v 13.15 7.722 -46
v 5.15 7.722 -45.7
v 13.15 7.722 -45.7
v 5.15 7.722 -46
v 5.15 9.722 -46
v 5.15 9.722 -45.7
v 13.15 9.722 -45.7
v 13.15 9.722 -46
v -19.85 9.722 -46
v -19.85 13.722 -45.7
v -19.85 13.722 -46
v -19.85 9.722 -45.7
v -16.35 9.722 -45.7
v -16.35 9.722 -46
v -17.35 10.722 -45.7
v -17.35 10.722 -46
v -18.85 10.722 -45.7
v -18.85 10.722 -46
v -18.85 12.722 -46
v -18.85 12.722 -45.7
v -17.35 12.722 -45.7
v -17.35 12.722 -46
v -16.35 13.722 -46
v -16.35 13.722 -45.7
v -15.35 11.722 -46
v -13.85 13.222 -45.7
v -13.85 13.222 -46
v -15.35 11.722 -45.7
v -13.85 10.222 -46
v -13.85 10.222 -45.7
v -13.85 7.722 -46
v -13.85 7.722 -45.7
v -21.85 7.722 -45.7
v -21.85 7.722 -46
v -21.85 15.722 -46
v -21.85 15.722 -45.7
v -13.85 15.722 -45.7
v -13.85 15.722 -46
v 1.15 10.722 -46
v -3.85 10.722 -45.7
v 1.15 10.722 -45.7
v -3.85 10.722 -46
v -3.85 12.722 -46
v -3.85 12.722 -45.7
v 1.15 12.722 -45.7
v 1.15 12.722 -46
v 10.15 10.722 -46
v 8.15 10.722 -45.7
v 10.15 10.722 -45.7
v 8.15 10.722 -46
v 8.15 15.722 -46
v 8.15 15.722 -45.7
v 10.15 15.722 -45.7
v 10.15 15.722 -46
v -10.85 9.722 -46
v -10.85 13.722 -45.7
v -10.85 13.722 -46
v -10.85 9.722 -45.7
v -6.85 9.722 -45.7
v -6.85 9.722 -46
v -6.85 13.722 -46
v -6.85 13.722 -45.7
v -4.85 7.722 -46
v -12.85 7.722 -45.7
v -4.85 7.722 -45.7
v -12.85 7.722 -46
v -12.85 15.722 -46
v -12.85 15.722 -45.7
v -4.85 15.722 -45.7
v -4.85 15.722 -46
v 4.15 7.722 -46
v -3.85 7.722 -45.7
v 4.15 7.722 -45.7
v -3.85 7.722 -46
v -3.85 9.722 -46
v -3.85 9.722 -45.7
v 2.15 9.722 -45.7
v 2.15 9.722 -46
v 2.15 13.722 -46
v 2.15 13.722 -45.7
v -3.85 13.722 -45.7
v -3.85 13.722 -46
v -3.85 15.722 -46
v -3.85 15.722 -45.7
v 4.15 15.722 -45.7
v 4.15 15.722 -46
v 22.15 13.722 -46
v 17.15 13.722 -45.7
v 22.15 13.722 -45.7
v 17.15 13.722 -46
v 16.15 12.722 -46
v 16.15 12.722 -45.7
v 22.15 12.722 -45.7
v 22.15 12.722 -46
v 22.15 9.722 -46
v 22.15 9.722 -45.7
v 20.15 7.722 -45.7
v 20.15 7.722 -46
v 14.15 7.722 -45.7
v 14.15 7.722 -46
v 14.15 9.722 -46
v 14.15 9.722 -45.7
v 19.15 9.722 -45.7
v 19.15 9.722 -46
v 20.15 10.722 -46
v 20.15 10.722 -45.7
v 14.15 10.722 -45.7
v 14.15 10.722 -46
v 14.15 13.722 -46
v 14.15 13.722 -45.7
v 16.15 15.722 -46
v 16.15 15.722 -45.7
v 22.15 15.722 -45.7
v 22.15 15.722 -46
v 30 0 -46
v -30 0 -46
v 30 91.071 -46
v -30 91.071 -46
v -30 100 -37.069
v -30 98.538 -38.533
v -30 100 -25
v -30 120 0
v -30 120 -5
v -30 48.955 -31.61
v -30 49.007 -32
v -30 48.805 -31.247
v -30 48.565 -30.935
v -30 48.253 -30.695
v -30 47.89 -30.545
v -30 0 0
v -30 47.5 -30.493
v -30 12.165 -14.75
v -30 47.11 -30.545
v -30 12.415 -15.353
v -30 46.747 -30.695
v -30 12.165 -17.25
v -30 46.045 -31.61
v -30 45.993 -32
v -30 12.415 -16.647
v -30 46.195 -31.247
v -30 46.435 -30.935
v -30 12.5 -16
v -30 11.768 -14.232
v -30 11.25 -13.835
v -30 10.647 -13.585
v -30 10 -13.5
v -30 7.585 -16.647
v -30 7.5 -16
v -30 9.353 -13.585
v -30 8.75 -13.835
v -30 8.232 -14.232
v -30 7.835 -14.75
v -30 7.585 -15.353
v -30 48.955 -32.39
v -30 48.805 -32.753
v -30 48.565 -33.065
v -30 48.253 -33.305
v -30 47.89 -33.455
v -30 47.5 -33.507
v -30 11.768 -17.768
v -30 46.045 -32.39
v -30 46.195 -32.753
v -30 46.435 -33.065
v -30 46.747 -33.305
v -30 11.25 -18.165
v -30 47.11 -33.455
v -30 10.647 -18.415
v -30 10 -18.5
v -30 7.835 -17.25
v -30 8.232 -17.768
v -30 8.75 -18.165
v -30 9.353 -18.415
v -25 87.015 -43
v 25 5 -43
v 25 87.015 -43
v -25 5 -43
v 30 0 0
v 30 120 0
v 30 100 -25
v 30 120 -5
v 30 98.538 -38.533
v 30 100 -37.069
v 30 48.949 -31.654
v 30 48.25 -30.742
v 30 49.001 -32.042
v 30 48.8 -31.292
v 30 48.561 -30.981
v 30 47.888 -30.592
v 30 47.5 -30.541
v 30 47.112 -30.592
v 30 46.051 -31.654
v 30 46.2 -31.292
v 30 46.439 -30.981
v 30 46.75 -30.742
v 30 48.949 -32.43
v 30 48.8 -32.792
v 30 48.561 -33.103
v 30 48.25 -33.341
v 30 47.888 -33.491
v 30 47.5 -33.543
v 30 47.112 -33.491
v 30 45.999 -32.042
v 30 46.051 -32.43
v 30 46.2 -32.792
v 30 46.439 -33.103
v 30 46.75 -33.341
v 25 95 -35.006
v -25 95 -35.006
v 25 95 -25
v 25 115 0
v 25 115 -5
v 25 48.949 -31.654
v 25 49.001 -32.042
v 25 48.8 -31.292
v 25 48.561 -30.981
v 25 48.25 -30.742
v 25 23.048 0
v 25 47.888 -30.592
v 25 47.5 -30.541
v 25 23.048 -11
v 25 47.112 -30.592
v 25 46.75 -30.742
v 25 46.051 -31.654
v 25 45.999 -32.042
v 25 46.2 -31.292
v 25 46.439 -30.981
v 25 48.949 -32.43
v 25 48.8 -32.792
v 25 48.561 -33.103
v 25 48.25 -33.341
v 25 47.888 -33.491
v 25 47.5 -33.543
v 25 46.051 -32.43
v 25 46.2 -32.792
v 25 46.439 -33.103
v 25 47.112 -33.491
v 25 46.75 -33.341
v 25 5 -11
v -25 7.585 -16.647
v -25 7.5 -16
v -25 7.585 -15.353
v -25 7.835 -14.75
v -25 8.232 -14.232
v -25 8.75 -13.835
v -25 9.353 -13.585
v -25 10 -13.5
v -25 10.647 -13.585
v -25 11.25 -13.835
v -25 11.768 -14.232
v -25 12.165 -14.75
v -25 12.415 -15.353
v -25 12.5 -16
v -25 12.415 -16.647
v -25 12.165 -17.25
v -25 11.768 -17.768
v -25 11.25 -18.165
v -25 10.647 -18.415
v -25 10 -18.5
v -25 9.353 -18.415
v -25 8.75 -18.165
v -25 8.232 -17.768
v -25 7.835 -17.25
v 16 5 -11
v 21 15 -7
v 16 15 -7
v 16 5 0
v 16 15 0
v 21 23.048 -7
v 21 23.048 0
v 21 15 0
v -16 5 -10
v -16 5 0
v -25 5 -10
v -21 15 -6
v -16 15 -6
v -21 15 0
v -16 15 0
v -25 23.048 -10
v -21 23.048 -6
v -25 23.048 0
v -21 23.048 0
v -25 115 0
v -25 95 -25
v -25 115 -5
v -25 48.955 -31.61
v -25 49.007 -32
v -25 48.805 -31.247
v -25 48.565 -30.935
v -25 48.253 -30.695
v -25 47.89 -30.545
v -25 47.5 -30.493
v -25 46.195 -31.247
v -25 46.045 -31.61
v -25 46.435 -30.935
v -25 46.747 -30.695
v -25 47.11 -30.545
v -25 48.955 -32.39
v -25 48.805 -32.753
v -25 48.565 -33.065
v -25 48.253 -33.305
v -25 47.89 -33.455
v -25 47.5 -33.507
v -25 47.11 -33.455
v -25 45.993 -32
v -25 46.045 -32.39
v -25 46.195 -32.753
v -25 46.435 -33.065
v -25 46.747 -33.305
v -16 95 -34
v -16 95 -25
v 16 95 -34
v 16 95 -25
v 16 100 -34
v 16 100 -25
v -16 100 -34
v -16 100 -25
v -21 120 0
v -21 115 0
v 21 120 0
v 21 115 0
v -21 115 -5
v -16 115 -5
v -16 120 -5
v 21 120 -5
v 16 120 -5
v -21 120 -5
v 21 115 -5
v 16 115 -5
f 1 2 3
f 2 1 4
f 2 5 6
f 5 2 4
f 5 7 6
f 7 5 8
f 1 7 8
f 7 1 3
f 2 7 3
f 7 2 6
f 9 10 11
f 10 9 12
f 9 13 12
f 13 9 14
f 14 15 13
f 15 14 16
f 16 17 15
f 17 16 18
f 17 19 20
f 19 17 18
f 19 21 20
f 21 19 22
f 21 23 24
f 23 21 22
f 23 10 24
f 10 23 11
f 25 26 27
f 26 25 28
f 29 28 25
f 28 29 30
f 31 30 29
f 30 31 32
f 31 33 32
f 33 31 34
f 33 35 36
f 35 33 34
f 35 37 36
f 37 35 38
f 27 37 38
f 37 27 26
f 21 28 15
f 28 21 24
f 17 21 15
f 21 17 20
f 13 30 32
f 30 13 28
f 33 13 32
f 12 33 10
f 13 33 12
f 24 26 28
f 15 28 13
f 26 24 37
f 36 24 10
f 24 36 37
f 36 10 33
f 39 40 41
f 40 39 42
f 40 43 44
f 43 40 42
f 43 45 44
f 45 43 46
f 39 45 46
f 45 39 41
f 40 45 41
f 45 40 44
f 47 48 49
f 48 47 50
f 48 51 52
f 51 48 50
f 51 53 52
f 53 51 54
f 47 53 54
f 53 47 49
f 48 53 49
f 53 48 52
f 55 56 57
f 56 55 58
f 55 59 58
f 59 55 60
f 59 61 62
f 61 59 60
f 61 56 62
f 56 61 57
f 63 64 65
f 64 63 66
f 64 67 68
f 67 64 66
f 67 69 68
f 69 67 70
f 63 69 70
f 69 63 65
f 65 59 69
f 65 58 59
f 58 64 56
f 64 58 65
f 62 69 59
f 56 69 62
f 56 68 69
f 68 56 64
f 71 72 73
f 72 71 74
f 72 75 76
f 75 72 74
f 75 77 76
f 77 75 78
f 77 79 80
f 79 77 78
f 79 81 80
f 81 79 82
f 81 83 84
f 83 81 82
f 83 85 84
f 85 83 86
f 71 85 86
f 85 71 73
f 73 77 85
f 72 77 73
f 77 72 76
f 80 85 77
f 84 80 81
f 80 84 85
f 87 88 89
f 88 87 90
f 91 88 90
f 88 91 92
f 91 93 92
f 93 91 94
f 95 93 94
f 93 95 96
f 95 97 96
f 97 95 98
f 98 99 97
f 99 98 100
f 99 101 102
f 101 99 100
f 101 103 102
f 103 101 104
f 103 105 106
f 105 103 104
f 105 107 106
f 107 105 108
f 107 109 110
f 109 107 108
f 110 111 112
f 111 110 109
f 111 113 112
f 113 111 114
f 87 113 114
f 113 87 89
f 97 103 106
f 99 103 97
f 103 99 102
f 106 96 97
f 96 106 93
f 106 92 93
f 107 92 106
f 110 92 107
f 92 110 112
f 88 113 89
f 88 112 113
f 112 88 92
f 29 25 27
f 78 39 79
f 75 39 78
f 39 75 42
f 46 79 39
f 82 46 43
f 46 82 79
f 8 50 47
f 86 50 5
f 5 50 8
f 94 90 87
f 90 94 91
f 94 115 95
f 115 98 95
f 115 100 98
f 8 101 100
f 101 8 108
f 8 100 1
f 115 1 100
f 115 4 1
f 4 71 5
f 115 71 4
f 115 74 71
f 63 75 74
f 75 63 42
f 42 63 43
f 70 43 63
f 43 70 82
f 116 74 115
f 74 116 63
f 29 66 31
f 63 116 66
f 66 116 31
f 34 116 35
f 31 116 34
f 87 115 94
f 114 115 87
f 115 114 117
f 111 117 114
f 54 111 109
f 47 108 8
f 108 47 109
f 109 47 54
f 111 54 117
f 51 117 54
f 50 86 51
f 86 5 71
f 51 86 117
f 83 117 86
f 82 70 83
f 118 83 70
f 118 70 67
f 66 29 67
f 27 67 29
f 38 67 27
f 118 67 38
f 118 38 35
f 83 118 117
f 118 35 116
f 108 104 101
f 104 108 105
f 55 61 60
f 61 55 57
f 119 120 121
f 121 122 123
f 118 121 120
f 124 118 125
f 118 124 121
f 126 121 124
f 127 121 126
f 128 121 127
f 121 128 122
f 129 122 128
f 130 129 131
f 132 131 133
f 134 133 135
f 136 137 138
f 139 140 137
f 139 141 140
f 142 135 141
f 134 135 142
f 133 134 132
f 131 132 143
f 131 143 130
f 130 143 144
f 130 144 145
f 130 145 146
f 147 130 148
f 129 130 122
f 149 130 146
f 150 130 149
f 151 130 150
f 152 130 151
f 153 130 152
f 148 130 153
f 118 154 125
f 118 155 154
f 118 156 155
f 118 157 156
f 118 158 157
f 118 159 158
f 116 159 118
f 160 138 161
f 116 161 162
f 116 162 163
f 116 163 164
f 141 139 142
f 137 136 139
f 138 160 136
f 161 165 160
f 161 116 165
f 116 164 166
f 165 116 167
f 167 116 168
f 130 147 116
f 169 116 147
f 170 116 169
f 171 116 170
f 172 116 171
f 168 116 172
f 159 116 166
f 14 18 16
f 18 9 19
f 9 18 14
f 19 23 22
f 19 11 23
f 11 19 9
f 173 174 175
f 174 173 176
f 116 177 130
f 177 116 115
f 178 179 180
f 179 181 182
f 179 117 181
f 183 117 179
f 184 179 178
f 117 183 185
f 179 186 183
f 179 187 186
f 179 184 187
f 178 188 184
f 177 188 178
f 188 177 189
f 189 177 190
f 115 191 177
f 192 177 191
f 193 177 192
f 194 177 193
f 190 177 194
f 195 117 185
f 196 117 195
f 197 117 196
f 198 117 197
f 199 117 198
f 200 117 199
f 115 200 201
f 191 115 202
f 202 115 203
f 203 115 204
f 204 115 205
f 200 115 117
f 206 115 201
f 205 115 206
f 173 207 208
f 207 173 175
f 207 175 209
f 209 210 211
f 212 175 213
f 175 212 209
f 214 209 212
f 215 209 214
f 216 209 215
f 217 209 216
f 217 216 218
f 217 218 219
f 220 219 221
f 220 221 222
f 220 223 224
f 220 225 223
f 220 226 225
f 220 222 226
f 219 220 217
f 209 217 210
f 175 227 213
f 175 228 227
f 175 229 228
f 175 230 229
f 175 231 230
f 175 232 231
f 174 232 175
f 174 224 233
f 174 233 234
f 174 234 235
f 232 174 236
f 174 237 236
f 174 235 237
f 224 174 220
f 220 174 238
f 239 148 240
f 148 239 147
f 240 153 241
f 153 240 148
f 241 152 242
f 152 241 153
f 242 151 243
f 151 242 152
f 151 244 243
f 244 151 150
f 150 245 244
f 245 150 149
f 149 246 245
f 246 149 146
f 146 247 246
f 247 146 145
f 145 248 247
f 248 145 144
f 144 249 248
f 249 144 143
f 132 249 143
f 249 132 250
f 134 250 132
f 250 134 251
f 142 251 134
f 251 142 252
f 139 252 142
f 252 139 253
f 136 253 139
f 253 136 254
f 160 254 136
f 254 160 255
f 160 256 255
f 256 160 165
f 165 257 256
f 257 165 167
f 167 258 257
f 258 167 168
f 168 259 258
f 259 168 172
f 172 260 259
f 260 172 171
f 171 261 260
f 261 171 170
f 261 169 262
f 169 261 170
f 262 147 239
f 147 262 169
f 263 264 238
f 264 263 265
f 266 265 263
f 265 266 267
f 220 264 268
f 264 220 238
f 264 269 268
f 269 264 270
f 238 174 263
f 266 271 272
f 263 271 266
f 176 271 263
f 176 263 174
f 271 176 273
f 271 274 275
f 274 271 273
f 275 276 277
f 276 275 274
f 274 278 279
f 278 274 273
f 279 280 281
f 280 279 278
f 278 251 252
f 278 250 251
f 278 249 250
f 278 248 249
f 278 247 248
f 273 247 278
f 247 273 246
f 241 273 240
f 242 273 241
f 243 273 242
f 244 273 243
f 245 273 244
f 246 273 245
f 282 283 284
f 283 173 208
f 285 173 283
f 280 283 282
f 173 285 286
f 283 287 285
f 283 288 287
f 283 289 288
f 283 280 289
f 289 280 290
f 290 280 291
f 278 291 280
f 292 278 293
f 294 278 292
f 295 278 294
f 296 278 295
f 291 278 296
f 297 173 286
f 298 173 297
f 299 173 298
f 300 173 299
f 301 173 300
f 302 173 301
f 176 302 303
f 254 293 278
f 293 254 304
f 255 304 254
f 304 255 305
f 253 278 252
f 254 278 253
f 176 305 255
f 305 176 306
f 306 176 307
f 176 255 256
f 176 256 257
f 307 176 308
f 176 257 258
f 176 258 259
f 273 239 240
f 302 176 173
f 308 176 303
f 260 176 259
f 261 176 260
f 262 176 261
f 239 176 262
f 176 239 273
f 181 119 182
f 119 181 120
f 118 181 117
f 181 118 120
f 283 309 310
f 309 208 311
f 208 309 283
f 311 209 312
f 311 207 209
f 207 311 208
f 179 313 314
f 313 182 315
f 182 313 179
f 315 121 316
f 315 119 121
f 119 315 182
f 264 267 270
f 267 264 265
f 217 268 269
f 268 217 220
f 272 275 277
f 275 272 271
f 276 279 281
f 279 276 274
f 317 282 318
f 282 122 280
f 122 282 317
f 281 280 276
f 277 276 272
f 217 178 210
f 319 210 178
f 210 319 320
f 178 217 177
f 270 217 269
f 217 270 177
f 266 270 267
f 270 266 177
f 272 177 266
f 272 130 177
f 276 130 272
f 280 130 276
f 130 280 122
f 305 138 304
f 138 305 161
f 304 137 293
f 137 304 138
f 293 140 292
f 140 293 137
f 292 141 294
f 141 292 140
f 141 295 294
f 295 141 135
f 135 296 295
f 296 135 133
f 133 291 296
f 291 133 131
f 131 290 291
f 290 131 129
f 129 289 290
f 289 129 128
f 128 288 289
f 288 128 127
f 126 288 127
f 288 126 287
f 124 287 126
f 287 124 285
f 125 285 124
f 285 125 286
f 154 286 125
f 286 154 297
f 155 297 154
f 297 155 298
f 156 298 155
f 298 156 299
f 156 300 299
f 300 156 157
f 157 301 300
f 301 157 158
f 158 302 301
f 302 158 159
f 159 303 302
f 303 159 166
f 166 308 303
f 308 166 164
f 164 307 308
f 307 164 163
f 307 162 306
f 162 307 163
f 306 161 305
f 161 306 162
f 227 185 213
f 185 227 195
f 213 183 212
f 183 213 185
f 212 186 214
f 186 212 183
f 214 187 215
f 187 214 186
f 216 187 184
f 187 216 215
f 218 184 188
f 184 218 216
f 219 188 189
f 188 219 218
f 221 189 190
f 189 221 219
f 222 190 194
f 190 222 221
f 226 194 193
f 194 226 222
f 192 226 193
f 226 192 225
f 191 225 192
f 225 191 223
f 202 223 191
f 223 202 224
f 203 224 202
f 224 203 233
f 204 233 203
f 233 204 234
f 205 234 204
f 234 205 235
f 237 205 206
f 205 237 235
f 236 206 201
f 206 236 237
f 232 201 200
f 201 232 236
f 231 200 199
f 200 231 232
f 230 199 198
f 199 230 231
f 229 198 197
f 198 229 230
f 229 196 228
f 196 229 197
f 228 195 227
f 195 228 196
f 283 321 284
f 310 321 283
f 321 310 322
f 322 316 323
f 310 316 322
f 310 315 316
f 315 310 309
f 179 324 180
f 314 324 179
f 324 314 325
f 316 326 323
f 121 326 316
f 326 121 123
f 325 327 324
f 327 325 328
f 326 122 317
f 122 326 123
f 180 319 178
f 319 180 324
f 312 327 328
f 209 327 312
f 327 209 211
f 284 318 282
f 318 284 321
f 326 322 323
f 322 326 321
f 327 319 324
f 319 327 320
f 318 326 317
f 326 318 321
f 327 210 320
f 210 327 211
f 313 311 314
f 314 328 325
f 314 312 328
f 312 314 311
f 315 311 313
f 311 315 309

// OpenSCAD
holeOnBack = 0; //0:No,1:Yes
capHoleHeight = 34;

module dummy() {}

stlObject1_points=[
   [13.1497,45.7,7.722054],
   [5.149704,46,7.722054],
   [13.1497,46,7.722054],
   [5.149704,45.7,7.722054],
   [5.149704,46,9.722054],
   [5.149704,45.7,9.722054],
   [13.1497,46,9.722054],
   [13.1497,45.7,9.722054],
   [-19.8503,45.7,13.72205],
   [-19.8503,46,9.722054],
   [-19.8503,46,13.72205],
   [-19.8503,45.7,9.722054],
   [-16.3503,46,9.722054],
   [-16.3503,45.7,9.722054],
   [-17.3503,46,10.72205],
   [-17.3503,45.7,10.72205],
   [-18.8503,46,10.72205],
   [-18.8503,45.7,10.72205],
   [-18.8503,46,12.72205],
   [-18.8503,45.7,12.72205],
   [-17.3503,46,12.72205],
   [-17.3503,45.7,12.72205],
   [-16.3503,46,13.72205],
   [-16.3503,45.7,13.72205],
   [-13.85029,45.7,13.22205],
   [-15.35029,46,11.72205],
   [-13.85029,46,13.22205],
   [-15.35029,45.7,11.72205],
   [-13.85029,46,10.22205],
   [-13.85029,45.7,10.22205],
   [-13.85029,46,7.722054],
   [-13.85029,45.7,7.722054],
   [-21.8503,46,7.722054],
   [-21.8503,45.7,7.722054],
   [-21.8503,46,15.72205],
   [-21.8503,45.7,15.72205],
   [-13.85029,46,15.72205],
   [-13.85029,45.7,15.72205],
   [1.149704,45.7,10.72205],
   [-3.850294,46,10.72205],
   [1.149704,46,10.72205],
   [-3.850294,45.7,10.72205],
   [-3.850294,46,12.72205],
   [-3.850294,45.7,12.72205],
   [1.149704,46,12.72205],
   [1.149704,45.7,12.72205],
   [10.1497,45.7,10.72205],
   [8.149704,46,10.72205],
   [10.1497,46,10.72205],
   [8.149704,45.7,10.72205],
   [8.149704,46,15.72205],
   [8.149704,45.7,15.72205],
   [10.1497,46,15.72205],
   [10.1497,45.7,15.72205],
   [-10.85029,45.7,13.72205],
   [-10.85029,46,9.722054],
   [-10.85029,46,13.72205],
   [-10.85029,45.7,9.722054],
   [-6.850294,46,9.722054],
   [-6.850294,45.7,9.722054],
   [-6.850294,46,13.72205],
   [-6.850294,45.7,13.72205],
   [-4.850294,45.7,7.722054],
   [-12.85029,46,7.722054],
   [-4.850294,46,7.722054],
   [-12.85029,45.7,7.722054],
   [-12.85029,46,15.72205],
   [-12.85029,45.7,15.72205],
   [-4.850294,46,15.72205],
   [-4.850294,45.7,15.72205],
   [4.149708,45.7,7.722054],
   [-3.850294,46,7.722054],
   [4.149708,46,7.722054],
   [-3.850294,45.7,7.722054],
   [-3.850294,46,9.722054],
   [-3.850294,45.7,9.722054],
   [2.149704,46,9.722054],
   [2.149704,45.7,9.722054],
   [2.149704,46,13.72205],
   [2.149704,45.7,13.72205],
   [-3.850294,46,13.72205],
   [-3.850294,45.7,13.72205],
   [-3.850294,46,15.72205],
   [-3.850294,45.7,15.72205],
   [4.149708,46,15.72205],
   [4.149708,45.7,15.72205],
   [22.14971,45.7,13.72205],
   [17.1497,46,13.72205],
   [22.14971,46,13.72205],
   [17.1497,45.7,13.72205],
   [16.14971,46,12.72205],
   [16.14971,45.7,12.72205],
   [22.14971,46,12.72205],
   [22.14971,45.7,12.72205],
   [22.14971,46,9.722054],
   [22.14971,45.7,9.722054],
   [20.1497,46,7.722054],
   [20.1497,45.7,7.722054],
   [14.14971,46,7.722054],
   [14.14971,45.7,7.722054],
   [14.14971,46,9.722054],
   [14.14971,45.7,9.722054],
   [19.14971,46,9.722054],
   [19.14971,45.7,9.722054],
   [20.1497,46,10.72205],
   [20.1497,45.7,10.72205],
   [14.14971,46,10.72205],
   [14.14971,45.7,10.72205],
   [14.14971,46,13.72205],
   [14.14971,45.7,13.72205],
   [16.14971,46,15.72205],
   [16.14971,45.7,15.72205],
   [22.14971,46,15.72205],
   [22.14971,45.7,15.72205],
   [30,46,0],
   [30,46,91.07107],
   [-30,46,0],
   [-30,46,91.07107],
   [-30,0,0],
   [-30,16,7.5],
   [-30,15.35295,7.585186],
   [-30,16.64705,7.585186],
   [-30,17.25,7.834937],
   [-30,17.76777,8.232233],
   [-30,18.16506,8.75],
   [-30,18.41481,9.352953],
   [-30,18.5,10],
   [-30,31.24666,46.19518],
   [-30,18.41481,10.64705],
   [-30,31.61004,46.04466],
   [-30,32,45.99332],
   [-30,30.69518,46.74666],
   [-30,18.16506,11.25],
   [-30,30.93462,46.43462],
   [-30,30.54465,47.11004],
   [-30,17.76777,11.76777],
   [-30,30.49332,47.5],
   [-30,17.25,12.16506],
   [-30,16.64705,12.41481],
   [-30,16,12.5],
   [-30,15.35295,12.41481],
   [-30,14.75,12.16506],
   [-30,25,100],
   [-30,14.23223,11.76777],
   [-30,5,120],
   [-30,13.83494,11.25],
   [-30,0,120],
   [-30,13.58519,10.64705],
   [-30,13.5,10],
   [-30,13.58519,9.352953],
   [-30,13.83494,8.75],
   [-30,14.23223,8.232233],
   [-30,14.75,7.834937],
   [-30,32.38996,46.04466],
   [-30,32.75334,46.19518],
   [-30,33.06539,46.43462],
   [-30,33.30482,46.74666],
   [-30,33.45535,47.11004],
   [-30,33.50668,47.5],
   [-30,33.45535,47.88996],
   [-30,33.30482,48.25334],
   [-30,38.53314,98.53793],
   [-30,33.06539,48.56539],
   [-30,32.75334,48.80482],
   [-30,37.06908,100],
   [-30,32.38996,48.95535],
   [-30,32,49.00668],
   [-30,31.61004,48.95535],
   [-30,31.24666,48.80482],
   [-30,30.93462,48.56539],
   [-30,30.69518,48.25334],
   [-30,30.54465,47.88996],
   [25,43,5],
   [-25,43,87.01475],
   [25,43,87.01475],
   [-25,43,5],
   [30,0,0],
   [30,33.34149,48.25029],
   [30,38.53314,98.53793],
   [30,33.4914,47.88838],
   [30,33.54253,47.5],
   [30,32.79224,48.79955],
   [30,37.06908,100],
   [30,33.10302,48.56108],
   [30,31.65356,48.94946],
   [30,25,100],
   [30,32.04195,49.00059],
   [30,32.43032,48.94946],
   [30,5,120],
   [30,30.54136,47.5],
   [30,30.59249,47.88838],
   [30,0,120],
   [30,30.98087,46.43893],
   [30,30.7424,46.74971],
   [30,30.59249,47.11162],
   [30,33.4914,47.11162],
   [30,33.34149,46.74971],
   [30,33.10302,46.43893],
   [30,32.79224,46.20045],
   [30,32.43032,46.05054],
   [30,32.04195,45.99941],
   [30,31.65356,46.05054],
   [30,31.29165,46.20045],
   [30,30.7424,48.25029],
   [30,30.98087,48.56108],
   [30,31.29165,48.79955],
   [25,35.00568,95],
   [-25,35.00568,95],
   [25,32.04195,49.00059],
   [25,32.43032,48.94946],
   [25,31.65356,48.94946],
   [25,25,95],
   [25,31.29165,48.79955],
   [25,30.98087,48.56108],
   [25,30.7424,48.25029],
   [25,30.59249,47.88838],
   [25,11,23.04751],
   [25,30.54136,47.5],
   [25,30.59249,47.11162],
   [25,30.7424,46.74971],
   [25,30.98087,46.43893],
   [25,11,5],
   [25,31.29165,46.20045],
   [25,31.65356,46.05054],
   [25,32.04195,45.99941],
   [25,32.43032,46.05054],
   [25,32.79224,46.20045],
   [25,33.10302,46.43893],
   [25,33.34149,46.74971],
   [25,33.4914,47.11162],
   [25,33.54253,47.5],
   [25,33.4914,47.88838],
   [25,33.34149,48.25029],
   [25,33.10302,48.56108],
   [25,32.79224,48.79955],
   [25,5,115],
   [25,0,23.04751],
   [25,0,115],
   [-25,16,7.5],
   [-25,16.64705,7.585186],
   [-25,15.35295,7.585186],
   [-25,14.75,7.834937],
   [-25,14.23223,8.232233],
   [-25,13.83494,8.75],
   [-25,13.58519,9.352953],
   [-25,13.5,10],
   [-25,13.58519,10.64705],
   [-25,13.83494,11.25],
   [-25,14.23223,11.76777],
   [-25,14.75,12.16506],
   [-25,15.35295,12.41481],
   [-25,16,12.5],
   [-25,16.64705,12.41481],
   [-25,17.25,12.16506],
   [-25,17.76777,11.76777],
   [-25,18.16506,11.25],
   [-25,18.41481,10.64705],
   [-25,18.5,10],
   [-25,18.41481,9.352953],
   [-25,18.16506,8.75],
   [-25,17.76777,8.232233],
   [-25,17.25,7.834937],
   [21,7,15],
   [16,11,5],
   [16,7,15],
   [16,0,5],
   [16,0,15],
   [21,7,23.04751],
   [21,0,23.04751],
   [21,0,15],
   [-16,10,5],
   [-25,10,5],
   [-16,0,5],
   [-21,6,15],
   [-16,6,15],
   [-16,0,15],
   [-21,0,15],
   [-25,10,23.04751],
   [-21,6,23.04751],
   [-25,0,23.04751],
   [-21,0,23.04751],
   [-25,33.50668,47.5],
   [-25,33.45535,47.11004],
   [-25,33.30482,46.74666],
   [-25,33.06539,48.56539],
   [-25,33.30482,48.25334],
   [-25,33.45535,47.88996],
   [-25,31.61004,48.95535],
   [-25,25,95],
   [-25,32,49.00668],
   [-25,32.38996,48.95535],
   [-25,5,115],
   [-25,30.54465,47.88996],
   [-25,30.69518,48.25334],
   [-25,0,115],
   [-25,30.49332,47.5],
   [-25,30.54465,47.11004],
   [-25,30.69518,46.74666],
   [-25,30.93462,46.43462],
   [-25,31.24666,46.19518],
   [-25,31.61004,46.04466],
   [-25,32,45.99332],
   [-25,32.38996,46.04466],
   [-25,32.75334,46.19518],
   [-25,33.06539,46.43462],
   [-25,30.93462,48.56539],
   [-25,31.24666,48.80482],
   [-25,32.75334,48.80482],
   [15,30,95],
   [-16,30,95],
   [-16,25,95],
   [15,25,95],
   [15,30,100],
   [-16,30,100],
   [-16,25,100],
   [15,25,100],
   [-21,0,120],
   [-21,0,115],
   [21,0,120],
   [21,0,115],
   [-21,5,115],
   [-16,5,115],
   [15,5,115],
   [15,5,120],
   [-16,5,120],
   [21,5,120],
   [-21,5,120],
   [21,5,115],
 ];
stlObject1_faces=[
  [0,1,2,],
  [3,1,0,],
  [3,4,1,],
  [5,4,3,],
  [5,6,4,],
  [7,6,5,],
  [7,2,6,],
  [0,2,7,],
  [5,0,7,],
  [3,0,5,],
  [8,9,10,],
  [11,9,8,],
  [11,12,9,],
  [13,12,11,],
  [13,14,12,],
  [15,14,13,],
  [15,16,14,],
  [17,16,15,],
  [17,18,16,],
  [19,18,17,],
  [19,20,18,],
  [21,20,19,],
  [21,22,20,],
  [23,22,21,],
  [23,10,22,],
  [8,10,23,],
  [24,25,26,],
  [27,25,24,],
  [27,28,25,],
  [29,28,27,],
  [29,30,28,],
  [31,30,29,],
  [31,32,30,],
  [33,32,31,],
  [33,34,32,],
  [35,34,33,],
  [35,36,34,],
  [37,36,35,],
  [37,26,36,],
  [24,26,37,],
  [23,35,8,],
  [37,35,23,],
  [24,37,23,],
  [35,11,8,],
  [33,11,35,],
  [13,11,33,],
  [31,13,33,],
  [29,13,31,],
  [27,13,29,],
  [15,13,27,],
  [21,15,27,],
  [19,15,21,],
  [17,15,19,],
  [27,23,21,],
  [24,23,27,],
  [38,39,40,],
  [41,39,38,],
  [41,42,39,],
  [43,42,41,],
  [43,44,42,],
  [45,44,43,],
  [45,40,44,],
  [38,40,45,],
  [43,38,45,],
  [41,38,43,],
  [46,47,48,],
  [49,47,46,],
  [49,50,47,],
  [51,50,49,],
  [51,52,50,],
  [53,52,51,],
  [53,48,52,],
  [46,48,53,],
  [51,46,53,],
  [49,46,51,],
  [54,55,56,],
  [57,55,54,],
  [57,58,55,],
  [59,58,57,],
  [59,60,58,],
  [61,60,59,],
  [61,56,60,],
  [54,56,61,],
  [62,63,64,],
  [65,63,62,],
  [65,66,63,],
  [67,66,65,],
  [67,68,66,],
  [69,68,67,],
  [69,64,68,],
  [62,64,69,],
  [61,69,54,],
  [62,69,61,],
  [59,62,61,],
  [57,62,59,],
  [65,62,57,],
  [67,65,57,],
  [67,54,69,],
  [57,54,67,],
  [70,71,72,],
  [73,71,70,],
  [73,74,71,],
  [75,74,73,],
  [75,76,74,],
  [77,76,75,],
  [77,78,76,],
  [79,78,77,],
  [79,80,78,],
  [81,80,79,],
  [81,82,80,],
  [83,82,81,],
  [83,84,82,],
  [85,84,83,],
  [85,72,84,],
  [70,72,85,],
  [79,85,83,],
  [70,85,79,],
  [77,70,79,],
  [73,70,77,],
  [75,73,77,],
  [83,81,79,],
  [86,87,88,],
  [89,87,86,],
  [89,90,87,],
  [91,90,89,],
  [91,92,90,],
  [93,92,91,],
  [93,94,92,],
  [95,94,93,],
  [95,96,94,],
  [97,96,95,],
  [97,98,96,],
  [99,98,97,],
  [99,100,98,],
  [101,100,99,],
  [101,102,100,],
  [103,102,101,],
  [103,104,102,],
  [105,104,103,],
  [105,106,104,],
  [107,106,105,],
  [107,108,106,],
  [109,108,107,],
  [109,110,108,],
  [111,110,109,],
  [111,112,110,],
  [113,112,111,],
  [113,88,112,],
  [86,88,113,],
  [113,89,86,],
  [111,89,113,],
  [109,89,111,],
  [91,89,109,],
  [107,91,109,],
  [105,91,107,],
  [93,91,105,],
  [95,93,105,],
  [103,95,105,],
  [97,95,103,],
  [99,97,103,],
  [103,101,99,],
  [1,114,2,],
  [72,114,1,],
  [4,72,1,],
  [84,72,4,],
  [47,84,4,],
  [50,84,47,],
  [115,84,50,],
  [52,115,50,],
  [110,115,52,],
  [108,110,52,],
  [98,2,114,],
  [6,2,98,],
  [100,6,98,],
  [106,6,100,],
  [102,106,100,],
  [104,106,102,],
  [6,48,4,],
  [108,48,6,],
  [106,108,6,],
  [28,26,25,],
  [63,26,28,],
  [30,63,28,],
  [116,63,30,],
  [32,116,30,],
  [34,116,32,],
  [117,116,34,],
  [36,117,34,],
  [66,117,36,],
  [26,66,36,],
  [63,66,26,],
  [39,74,40,],
  [64,74,39,],
  [68,64,39,],
  [76,40,74,],
  [44,40,76,],
  [78,44,76,],
  [80,44,78,],
  [42,44,80,],
  [68,42,80,],
  [39,42,68,],
  [4,48,47,],
  [108,52,48,],
  [116,64,63,],
  [71,64,116,],
  [114,71,116,],
  [72,71,114,],
  [68,117,66,],
  [82,117,68,],
  [80,82,68,],
  [115,82,84,],
  [117,82,115,],
  [64,71,74,],
  [92,87,90,],
  [88,87,92,],
  [114,88,92,],
  [112,88,114,],
  [115,112,114,],
  [110,112,115,],
  [114,96,98,],
  [94,96,114,],
  [92,94,114,],
  [58,56,55,],
  [60,56,58,],
  [118,119,120,],
  [121,119,118,],
  [116,121,118,],
  [122,121,116,],
  [123,122,116,],
  [116,124,123,],
  [125,124,116,],
  [126,125,116,],
  [126,127,128,],
  [129,127,126,],
  [130,129,126,],
  [128,131,132,],
  [133,131,128,],
  [127,133,128,],
  [134,132,131,],
  [135,132,134,],
  [136,135,134,],
  [137,135,136,],
  [138,137,136,],
  [136,139,138,],
  [140,139,136,],
  [141,140,136,],
  [142,141,136,],
  [143,141,142,],
  [144,143,142,],
  [145,143,144,],
  [146,145,144,],
  [118,145,146,],
  [147,145,118,],
  [148,147,118,],
  [118,149,148,],
  [150,149,118,],
  [151,150,118,],
  [118,152,151,],
  [120,152,118,],
  [116,130,126,],
  [153,130,116,],
  [154,153,116,],
  [116,155,154,],
  [156,155,116,],
  [157,156,116,],
  [116,158,157,],
  [117,158,116,],
  [159,158,117,],
  [160,159,117,],
  [161,160,117,],
  [162,160,161,],
  [163,162,161,],
  [164,163,161,],
  [165,163,164,],
  [166,165,164,],
  [164,167,166,],
  [142,167,164,],
  [168,167,142,],
  [169,168,142,],
  [142,170,169,],
  [171,170,142,],
  [136,171,142,],
  [9,16,10,],
  [14,16,9,],
  [12,14,9,],
  [10,20,22,],
  [18,20,10,],
  [16,18,10,],
  [172,173,174,],
  [175,173,172,],
  [114,118,176,],
  [116,118,114,],
  [115,177,178,],
  [179,177,115,],
  [180,179,115,],
  [178,181,182,],
  [183,181,178,],
  [177,183,178,],
  [182,184,185,],
  [186,184,182,],
  [187,186,182,],
  [185,176,188,],
  [189,176,185,],
  [190,189,185,],
  [176,191,188,],
  [176,192,114,],
  [193,192,176,],
  [194,193,176,],
  [114,180,115,],
  [195,180,114,],
  [196,195,114,],
  [182,181,187,],
  [114,197,196,],
  [198,197,114,],
  [199,198,114,],
  [114,200,199,],
  [201,200,114,],
  [202,201,114,],
  [114,192,202,],
  [176,189,194,],
  [185,203,190,],
  [204,203,185,],
  [205,204,185,],
  [185,184,205,],
  [173,206,174,],
  [207,206,173,],
  [206,208,209,],
  [210,208,206,],
  [211,210,206,],
  [212,210,211,],
  [213,212,211,],
  [211,214,213,],
  [215,214,211,],
  [216,215,211,],
  [217,215,216,],
  [218,217,216,],
  [216,219,218,],
  [220,219,216,],
  [221,220,216,],
  [222,220,221,],
  [172,222,221,],
  [223,222,172,],
  [224,223,172,],
  [172,225,224,],
  [226,225,172,],
  [227,226,172,],
  [172,228,227,],
  [229,228,172,],
  [230,229,172,],
  [174,230,172,],
  [231,230,174,],
  [232,231,174,],
  [174,233,232,],
  [206,233,174,],
  [234,233,206,],
  [209,234,206,],
  [235,216,211,],
  [236,216,235,],
  [237,236,235,],
  [238,121,239,],
  [119,121,238,],
  [240,119,238,],
  [120,119,240,],
  [241,120,240,],
  [152,120,241,],
  [242,152,241,],
  [151,152,242,],
  [243,151,242,],
  [150,151,243,],
  [244,150,243,],
  [149,150,244,],
  [245,149,244,],
  [148,149,245,],
  [246,148,245,],
  [147,148,246,],
  [247,147,246,],
  [145,147,247,],
  [248,145,247,],
  [143,145,248,],
  [249,143,248,],
  [141,143,249,],
  [250,141,249,],
  [140,141,250,],
  [251,140,250,],
  [139,140,251,],
  [252,139,251,],
  [138,139,252,],
  [253,138,252,],
  [137,138,253,],
  [254,137,253,],
  [135,137,254,],
  [255,135,254,],
  [132,135,255,],
  [256,132,255,],
  [128,132,256,],
  [257,128,256,],
  [126,128,257,],
  [258,126,257,],
  [125,126,258,],
  [259,125,258,],
  [124,125,259,],
  [260,124,259,],
  [123,124,260,],
  [261,123,260,],
  [122,123,261,],
  [239,122,261,],
  [121,122,239,],
  [262,263,221,],
  [264,263,262,],
  [264,265,263,],
  [266,265,264,],
  [262,216,267,],
  [221,216,262,],
  [268,262,267,],
  [269,262,268,],
  [263,172,221,],
  [175,172,263,],
  [270,175,263,],
  [271,175,270,],
  [270,265,272,],
  [263,265,270,],
  [273,270,274,],
  [271,270,273,],
  [275,273,274,],
  [276,273,275,],
  [277,273,278,],
  [271,273,277,],
  [278,279,277,],
  [280,279,278,],
  [175,281,173,],
  [282,281,175,],
  [283,282,175,],
  [173,284,207,],
  [285,284,173,],
  [286,285,173,],
  [207,287,288,],
  [289,287,207,],
  [290,289,207,],
  [288,277,291,],
  [292,277,288,],
  [293,292,288,],
  [291,279,294,],
  [277,279,291,],
  [277,246,271,],
  [247,246,277,],
  [248,247,277,],
  [271,239,175,],
  [238,239,271,],
  [240,238,271,],
  [271,241,240,],
  [242,241,271,],
  [243,242,271,],
  [271,244,243,],
  [245,244,271,],
  [246,245,271,],
  [277,249,248,],
  [250,249,277,],
  [251,250,277,],
  [277,252,251,],
  [253,252,277,],
  [295,253,277,],
  [296,253,295,],
  [254,253,296,],
  [255,254,296,],
  [297,255,296,],
  [256,255,297,],
  [298,256,297,],
  [299,256,298,],
  [257,256,299,],
  [300,257,299,],
  [175,257,300,],
  [301,175,300,],
  [302,175,301,],
  [303,175,302,],
  [304,175,303,],
  [283,175,304,],
  [175,258,257,],
  [259,258,175,],
  [260,259,175,],
  [175,261,260,],
  [239,261,175,],
  [277,292,295,],
  [288,305,293,],
  [306,305,288,],
  [287,306,288,],
  [207,307,290,],
  [284,307,207,],
  [173,281,286,],
  [161,182,164,],
  [178,182,161,],
  [115,161,117,],
  [178,161,115,],
  [207,308,206,],
  [309,308,207,],
  [288,309,207,],
  [310,309,288,],
  [308,211,206,],
  [311,211,308,],
  [312,182,185,],
  [164,182,312,],
  [313,164,312,],
  [142,164,313,],
  [314,142,313,],
  [185,315,312,],
  [269,264,262,],
  [266,264,269,],
  [236,267,216,],
  [268,267,236,],
  [272,274,270,],
  [275,274,272,],
  [276,278,273,],
  [280,278,276,],
  [146,279,118,],
  [294,279,146,],
  [316,294,146,],
  [317,294,316,],
  [118,272,176,],
  [276,272,118,],
  [279,276,118,],
  [280,276,279,],
  [176,236,191,],
  [269,236,176,],
  [265,269,176,],
  [266,269,265,],
  [237,191,236,],
  [318,191,237,],
  [319,318,237,],
  [269,268,236,],
  [176,272,265,],
  [276,275,272,],
  [301,153,302,],
  [130,153,301,],
  [300,130,301,],
  [129,130,300,],
  [299,129,300,],
  [127,129,299,],
  [298,127,299,],
  [133,127,298,],
  [297,133,298,],
  [131,133,297,],
  [296,131,297,],
  [134,131,296,],
  [295,134,296,],
  [136,134,295,],
  [292,136,295,],
  [171,136,292,],
  [293,171,292,],
  [170,171,293,],
  [305,170,293,],
  [169,170,305,],
  [306,169,305,],
  [168,169,306,],
  [287,168,306,],
  [167,168,287,],
  [289,167,287,],
  [166,167,289,],
  [290,166,289,],
  [165,166,290,],
  [307,165,290,],
  [163,165,307,],
  [284,163,307,],
  [162,163,284,],
  [285,162,284,],
  [160,162,285,],
  [286,160,285,],
  [159,160,286,],
  [281,159,286,],
  [158,159,281,],
  [282,158,281,],
  [157,158,282,],
  [283,157,282,],
  [156,157,283,],
  [304,156,283,],
  [155,156,304,],
  [303,155,304,],
  [154,155,303,],
  [302,154,303,],
  [153,154,302,],
  [208,187,209,],
  [186,187,208,],
  [210,186,208,],
  [184,186,210,],
  [212,184,210,],
  [205,184,212,],
  [213,205,212,],
  [204,205,213,],
  [214,204,213,],
  [203,204,214,],
  [215,203,214,],
  [190,203,215,],
  [217,190,215,],
  [189,190,217,],
  [218,189,217,],
  [194,189,218,],
  [219,194,218,],
  [193,194,219,],
  [220,193,219,],
  [192,193,220,],
  [222,192,220,],
  [202,192,222,],
  [223,202,222,],
  [201,202,223,],
  [224,201,223,],
  [200,201,224,],
  [225,200,224,],
  [199,200,225,],
  [226,199,225,],
  [198,199,226,],
  [227,198,226,],
  [197,198,227,],
  [228,197,227,],
  [196,197,228,],
  [229,196,228,],
  [195,196,229,],
  [230,195,229,],
  [180,195,230,],
  [231,180,230,],
  [179,180,231,],
  [232,179,231,],
  [177,179,232,],
  [233,177,232,],
  [183,177,233,],
  [234,183,233,],
  [181,183,234,],
  [209,181,234,],
  [187,181,209,],
  [313,308,309,],
  [312,308,313,],
  [310,320,321,],
  [288,320,310,],
  [291,320,288,],
  [322,315,323,],
  [311,315,322,],
  [312,315,311,],
  [308,312,311,],
  [314,321,324,],
  [310,321,314,],
  [313,310,314,],
  [309,310,313,],
  [315,325,323,],
  [185,325,315,],
  [188,325,185,],
  [326,314,324,],
  [142,314,326,],
  [144,142,326,],
  [323,327,322,],
  [325,327,323,],
  [316,144,326,],
  [146,144,316,],
  [191,325,188,],
  [318,325,191,],
  [327,311,322,],
  [211,311,327,],
  [235,211,327,],
  [294,320,291,],
  [317,320,294,],
  [321,326,324,],
  [320,326,321,],
  [325,319,327,],
  [318,319,325,],
  [316,320,317,],
  [326,320,316,],
  [319,235,327,],
  [237,235,319,],
];
module stlObject1() { polyhedron(points=stlObject1_points, faces=stlObject1_faces); }
stlObject1_min=[for(i=[0:2]) min([for(p=stlObject1_points) p[i]])];
stlObject1_max=[for(i=[0:2]) max([for(p=stlObject1_points) p[i]])];
stlObject1_size=[for(i=[0:2]) stlObject1_max[i]-stlObject1_min[i]];
    
module main() {
    if (holeOnBack) {
        difference() {
            stlObject1();
            cube([3.2,3.2,20],center=true);
            translate([0,1.6,0]) cylinder(d=3,h=20,center=true,$fn=16);
        }
        translate([-30,20,40]) cube([5,20,20]);
    }
    else {
        stlObject1();
    }
}

rotate([-90,0,0])
difference() {
    main();
    translate([-16,0,15]) cube([32,capHoleHeight,120]);
}
